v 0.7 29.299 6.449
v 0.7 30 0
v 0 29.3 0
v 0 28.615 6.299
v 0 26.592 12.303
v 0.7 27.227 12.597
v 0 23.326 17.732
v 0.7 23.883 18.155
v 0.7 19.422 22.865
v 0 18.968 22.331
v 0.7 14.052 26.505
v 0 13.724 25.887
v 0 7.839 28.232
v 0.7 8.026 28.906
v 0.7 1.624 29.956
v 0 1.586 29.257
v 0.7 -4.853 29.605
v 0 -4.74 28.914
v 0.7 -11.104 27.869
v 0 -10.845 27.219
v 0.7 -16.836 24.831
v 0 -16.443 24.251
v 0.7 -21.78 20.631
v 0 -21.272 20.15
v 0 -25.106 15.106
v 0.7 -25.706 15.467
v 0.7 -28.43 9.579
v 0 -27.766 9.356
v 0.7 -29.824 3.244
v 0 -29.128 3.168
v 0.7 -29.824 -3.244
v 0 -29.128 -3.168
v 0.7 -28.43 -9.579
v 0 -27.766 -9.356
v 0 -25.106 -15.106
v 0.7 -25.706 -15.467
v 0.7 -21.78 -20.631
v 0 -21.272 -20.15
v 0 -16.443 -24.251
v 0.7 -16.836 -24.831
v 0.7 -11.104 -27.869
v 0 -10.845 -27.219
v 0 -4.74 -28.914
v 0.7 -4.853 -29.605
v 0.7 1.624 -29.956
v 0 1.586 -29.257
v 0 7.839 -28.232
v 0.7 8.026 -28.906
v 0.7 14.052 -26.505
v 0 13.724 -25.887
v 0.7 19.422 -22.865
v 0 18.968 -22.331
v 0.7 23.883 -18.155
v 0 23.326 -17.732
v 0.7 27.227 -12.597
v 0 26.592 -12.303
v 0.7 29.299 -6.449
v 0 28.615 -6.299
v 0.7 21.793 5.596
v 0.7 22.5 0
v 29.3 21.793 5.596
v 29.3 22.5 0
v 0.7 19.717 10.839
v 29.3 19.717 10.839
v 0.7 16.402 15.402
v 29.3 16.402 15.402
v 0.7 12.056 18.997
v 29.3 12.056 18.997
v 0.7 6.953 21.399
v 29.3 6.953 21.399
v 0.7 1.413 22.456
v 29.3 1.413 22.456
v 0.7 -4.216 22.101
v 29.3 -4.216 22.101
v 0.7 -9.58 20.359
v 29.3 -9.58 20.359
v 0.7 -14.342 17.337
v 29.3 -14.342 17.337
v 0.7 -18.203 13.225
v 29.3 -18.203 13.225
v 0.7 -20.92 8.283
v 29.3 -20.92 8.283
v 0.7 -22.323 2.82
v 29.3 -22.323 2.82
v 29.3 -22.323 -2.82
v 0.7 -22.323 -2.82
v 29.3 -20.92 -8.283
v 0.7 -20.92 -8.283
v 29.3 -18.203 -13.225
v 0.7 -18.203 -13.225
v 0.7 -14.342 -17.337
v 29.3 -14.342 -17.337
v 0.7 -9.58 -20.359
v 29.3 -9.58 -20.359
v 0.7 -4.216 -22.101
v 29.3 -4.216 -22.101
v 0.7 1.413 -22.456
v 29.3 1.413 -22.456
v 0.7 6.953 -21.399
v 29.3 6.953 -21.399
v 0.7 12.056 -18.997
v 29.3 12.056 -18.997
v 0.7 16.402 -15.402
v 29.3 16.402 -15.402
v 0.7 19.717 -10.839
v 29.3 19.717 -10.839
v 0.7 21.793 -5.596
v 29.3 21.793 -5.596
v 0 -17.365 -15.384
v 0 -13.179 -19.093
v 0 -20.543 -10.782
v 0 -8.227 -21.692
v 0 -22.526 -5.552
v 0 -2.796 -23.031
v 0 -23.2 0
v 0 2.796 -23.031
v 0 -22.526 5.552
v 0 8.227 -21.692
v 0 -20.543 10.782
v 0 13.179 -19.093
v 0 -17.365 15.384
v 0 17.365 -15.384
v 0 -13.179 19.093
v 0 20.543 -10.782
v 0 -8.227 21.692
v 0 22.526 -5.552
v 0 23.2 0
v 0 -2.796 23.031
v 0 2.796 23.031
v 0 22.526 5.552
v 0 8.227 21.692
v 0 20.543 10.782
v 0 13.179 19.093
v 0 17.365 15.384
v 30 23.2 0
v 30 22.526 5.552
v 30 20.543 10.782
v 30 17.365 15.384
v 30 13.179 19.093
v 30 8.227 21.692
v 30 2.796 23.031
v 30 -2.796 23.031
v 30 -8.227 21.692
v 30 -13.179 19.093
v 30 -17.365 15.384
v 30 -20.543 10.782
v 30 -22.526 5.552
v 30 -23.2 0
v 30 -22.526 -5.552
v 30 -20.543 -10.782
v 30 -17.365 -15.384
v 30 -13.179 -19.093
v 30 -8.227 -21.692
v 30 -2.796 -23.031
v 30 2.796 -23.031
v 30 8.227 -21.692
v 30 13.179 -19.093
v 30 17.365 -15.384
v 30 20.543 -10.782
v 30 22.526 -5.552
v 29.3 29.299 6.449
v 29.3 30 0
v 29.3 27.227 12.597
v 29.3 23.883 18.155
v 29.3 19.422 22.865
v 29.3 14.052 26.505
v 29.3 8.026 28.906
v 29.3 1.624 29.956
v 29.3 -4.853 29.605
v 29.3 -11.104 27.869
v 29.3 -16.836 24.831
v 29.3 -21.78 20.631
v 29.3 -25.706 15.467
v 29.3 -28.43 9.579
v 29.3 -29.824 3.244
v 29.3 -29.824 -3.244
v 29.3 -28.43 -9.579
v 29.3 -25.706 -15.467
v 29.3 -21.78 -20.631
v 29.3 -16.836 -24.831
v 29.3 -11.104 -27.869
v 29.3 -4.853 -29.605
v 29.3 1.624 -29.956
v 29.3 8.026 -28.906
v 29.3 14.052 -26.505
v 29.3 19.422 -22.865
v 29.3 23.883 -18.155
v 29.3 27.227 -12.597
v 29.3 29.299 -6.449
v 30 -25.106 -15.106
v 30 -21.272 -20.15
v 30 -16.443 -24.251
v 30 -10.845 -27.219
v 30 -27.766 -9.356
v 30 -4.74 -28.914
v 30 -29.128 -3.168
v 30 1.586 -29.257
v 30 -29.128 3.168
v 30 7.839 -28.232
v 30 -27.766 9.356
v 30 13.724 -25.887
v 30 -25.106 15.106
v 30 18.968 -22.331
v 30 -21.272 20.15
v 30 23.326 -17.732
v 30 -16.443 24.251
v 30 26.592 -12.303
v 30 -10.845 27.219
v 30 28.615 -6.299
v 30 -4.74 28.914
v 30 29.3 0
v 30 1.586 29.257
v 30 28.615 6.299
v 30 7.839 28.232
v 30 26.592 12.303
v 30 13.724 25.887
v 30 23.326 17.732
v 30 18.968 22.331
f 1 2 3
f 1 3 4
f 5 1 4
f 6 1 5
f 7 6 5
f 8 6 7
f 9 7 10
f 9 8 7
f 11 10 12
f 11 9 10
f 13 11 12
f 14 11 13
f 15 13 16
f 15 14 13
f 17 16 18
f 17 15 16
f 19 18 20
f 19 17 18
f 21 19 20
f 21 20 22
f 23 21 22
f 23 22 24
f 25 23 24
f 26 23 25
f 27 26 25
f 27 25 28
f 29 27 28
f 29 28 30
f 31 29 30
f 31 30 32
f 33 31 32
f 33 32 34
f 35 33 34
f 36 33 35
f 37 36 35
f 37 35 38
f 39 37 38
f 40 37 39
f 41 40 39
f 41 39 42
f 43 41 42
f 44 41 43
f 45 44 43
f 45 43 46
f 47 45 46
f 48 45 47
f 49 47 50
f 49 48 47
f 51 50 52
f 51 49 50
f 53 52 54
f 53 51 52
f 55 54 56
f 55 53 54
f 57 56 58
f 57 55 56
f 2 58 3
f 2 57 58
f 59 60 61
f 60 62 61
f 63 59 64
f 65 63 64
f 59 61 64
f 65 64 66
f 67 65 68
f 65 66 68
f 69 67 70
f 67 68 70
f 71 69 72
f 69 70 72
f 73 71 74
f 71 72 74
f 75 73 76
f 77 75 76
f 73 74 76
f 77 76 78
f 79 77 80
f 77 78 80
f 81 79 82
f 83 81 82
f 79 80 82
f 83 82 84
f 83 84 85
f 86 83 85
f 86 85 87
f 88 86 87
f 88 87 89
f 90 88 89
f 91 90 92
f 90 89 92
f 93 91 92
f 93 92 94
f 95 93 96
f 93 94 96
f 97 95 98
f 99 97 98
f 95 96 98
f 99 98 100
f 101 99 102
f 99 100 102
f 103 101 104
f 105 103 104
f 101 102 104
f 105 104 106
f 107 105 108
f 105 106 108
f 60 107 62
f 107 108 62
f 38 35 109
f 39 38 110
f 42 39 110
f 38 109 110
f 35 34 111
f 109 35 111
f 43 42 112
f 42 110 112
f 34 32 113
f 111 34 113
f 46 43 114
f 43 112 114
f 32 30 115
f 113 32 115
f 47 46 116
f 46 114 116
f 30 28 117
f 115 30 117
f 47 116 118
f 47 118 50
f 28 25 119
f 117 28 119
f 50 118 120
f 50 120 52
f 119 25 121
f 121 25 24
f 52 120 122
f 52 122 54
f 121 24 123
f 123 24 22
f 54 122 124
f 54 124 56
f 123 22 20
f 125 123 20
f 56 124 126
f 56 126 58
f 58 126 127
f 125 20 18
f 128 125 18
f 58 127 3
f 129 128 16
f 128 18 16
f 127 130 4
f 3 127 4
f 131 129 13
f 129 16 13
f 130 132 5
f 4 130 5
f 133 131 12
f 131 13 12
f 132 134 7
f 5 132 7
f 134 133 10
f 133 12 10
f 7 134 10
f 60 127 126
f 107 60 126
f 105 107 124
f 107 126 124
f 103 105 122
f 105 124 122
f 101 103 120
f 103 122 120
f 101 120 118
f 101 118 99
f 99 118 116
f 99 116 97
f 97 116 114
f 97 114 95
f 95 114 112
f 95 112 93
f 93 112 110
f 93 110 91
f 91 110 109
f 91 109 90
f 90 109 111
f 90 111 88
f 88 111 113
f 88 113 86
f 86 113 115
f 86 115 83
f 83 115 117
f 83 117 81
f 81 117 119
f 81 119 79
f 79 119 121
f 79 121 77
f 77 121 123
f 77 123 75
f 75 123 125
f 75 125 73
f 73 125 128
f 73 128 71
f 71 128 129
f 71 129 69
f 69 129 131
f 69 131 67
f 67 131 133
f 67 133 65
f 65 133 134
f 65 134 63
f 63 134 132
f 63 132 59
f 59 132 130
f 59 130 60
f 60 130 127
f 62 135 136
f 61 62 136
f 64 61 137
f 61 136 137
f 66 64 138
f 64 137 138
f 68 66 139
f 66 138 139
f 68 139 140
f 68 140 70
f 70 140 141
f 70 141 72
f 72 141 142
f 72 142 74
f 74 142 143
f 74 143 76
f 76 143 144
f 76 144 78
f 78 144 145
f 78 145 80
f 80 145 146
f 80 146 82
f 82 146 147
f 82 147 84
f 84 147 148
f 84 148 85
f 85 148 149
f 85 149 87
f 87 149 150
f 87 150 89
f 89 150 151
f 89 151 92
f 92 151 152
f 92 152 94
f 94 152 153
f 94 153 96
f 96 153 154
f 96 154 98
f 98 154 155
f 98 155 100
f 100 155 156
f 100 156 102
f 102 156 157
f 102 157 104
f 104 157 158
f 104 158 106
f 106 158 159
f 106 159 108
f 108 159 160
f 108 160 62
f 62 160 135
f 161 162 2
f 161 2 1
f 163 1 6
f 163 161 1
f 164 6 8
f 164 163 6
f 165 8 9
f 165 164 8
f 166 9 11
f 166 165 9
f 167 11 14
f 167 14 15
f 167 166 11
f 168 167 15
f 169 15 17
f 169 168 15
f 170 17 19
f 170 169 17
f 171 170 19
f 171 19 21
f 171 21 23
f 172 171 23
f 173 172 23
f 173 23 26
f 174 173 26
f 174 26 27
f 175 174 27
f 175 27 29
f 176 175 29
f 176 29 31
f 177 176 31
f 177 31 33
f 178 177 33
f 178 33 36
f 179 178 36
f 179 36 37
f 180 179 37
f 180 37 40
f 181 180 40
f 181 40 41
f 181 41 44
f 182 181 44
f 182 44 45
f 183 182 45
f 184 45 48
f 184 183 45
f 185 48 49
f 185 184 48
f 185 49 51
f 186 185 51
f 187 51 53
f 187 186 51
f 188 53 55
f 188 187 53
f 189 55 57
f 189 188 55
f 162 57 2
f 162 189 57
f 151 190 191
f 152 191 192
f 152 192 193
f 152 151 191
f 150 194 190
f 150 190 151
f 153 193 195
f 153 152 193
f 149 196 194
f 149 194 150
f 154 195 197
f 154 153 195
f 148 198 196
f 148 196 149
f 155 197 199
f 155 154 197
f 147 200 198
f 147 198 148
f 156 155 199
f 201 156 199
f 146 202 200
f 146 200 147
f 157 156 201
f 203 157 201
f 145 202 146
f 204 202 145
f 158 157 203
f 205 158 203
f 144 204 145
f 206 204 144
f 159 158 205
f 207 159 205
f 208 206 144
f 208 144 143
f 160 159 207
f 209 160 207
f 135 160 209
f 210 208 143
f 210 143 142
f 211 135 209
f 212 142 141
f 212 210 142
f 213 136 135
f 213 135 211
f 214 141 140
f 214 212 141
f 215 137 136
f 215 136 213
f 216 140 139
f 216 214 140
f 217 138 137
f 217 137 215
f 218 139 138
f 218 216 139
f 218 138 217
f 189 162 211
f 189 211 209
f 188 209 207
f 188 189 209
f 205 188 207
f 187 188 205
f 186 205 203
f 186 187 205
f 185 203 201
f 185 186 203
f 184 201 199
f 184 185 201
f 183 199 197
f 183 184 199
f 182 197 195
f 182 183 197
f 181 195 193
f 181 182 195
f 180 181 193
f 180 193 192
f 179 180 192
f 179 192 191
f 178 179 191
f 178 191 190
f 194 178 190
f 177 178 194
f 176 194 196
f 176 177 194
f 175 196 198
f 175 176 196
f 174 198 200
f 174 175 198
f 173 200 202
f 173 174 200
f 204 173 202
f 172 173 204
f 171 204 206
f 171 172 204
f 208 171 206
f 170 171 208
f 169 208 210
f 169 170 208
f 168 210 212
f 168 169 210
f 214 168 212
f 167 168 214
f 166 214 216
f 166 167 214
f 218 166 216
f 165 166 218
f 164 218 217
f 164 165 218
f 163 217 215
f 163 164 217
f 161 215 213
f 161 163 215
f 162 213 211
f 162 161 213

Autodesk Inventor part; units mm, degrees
ref_plane "YZ Plane" through (0, 0, 0) normal (1, 0, 0) x (0, 1, 0)
ref_plane "XZ Plane" through (0, 0, 0) normal (0, 1, 0) x (-1, 0, 0)
ref_plane "XY Plane" through (0, 0, 0) normal (0, 0, 1) x (1, 0, 0)
sketch "Эскиз1" plane through (0, 0, 0) normal (0, 0, 1) x (1, 0, 0)
  line L0 (0, 0) -> (37.7119, 0)
  line L1 (0, 22.5) -> (30, 22.5)
  line L2 (0, 30) -> (30, 30)
  line L3 (0, 30) -> (0, 22.5)
  line L4 (30, 30) -> (30, 22.5)
  dimension "d0" = 45
  dimension "d1" = 30
  dimension "d3" = 60
revolve "Вращение1" add sketch "Эскиз1" angle 360 about axis through (0, 0, 0) along (1, 0, 0)
chamfer "Фаска1" distance 0.7 angle 45 4 edges at (30, -30, 0) (30, -22.5, 0) (0, -22.5, 0) (0, -30, 0)
properties part number "Скольжение"
